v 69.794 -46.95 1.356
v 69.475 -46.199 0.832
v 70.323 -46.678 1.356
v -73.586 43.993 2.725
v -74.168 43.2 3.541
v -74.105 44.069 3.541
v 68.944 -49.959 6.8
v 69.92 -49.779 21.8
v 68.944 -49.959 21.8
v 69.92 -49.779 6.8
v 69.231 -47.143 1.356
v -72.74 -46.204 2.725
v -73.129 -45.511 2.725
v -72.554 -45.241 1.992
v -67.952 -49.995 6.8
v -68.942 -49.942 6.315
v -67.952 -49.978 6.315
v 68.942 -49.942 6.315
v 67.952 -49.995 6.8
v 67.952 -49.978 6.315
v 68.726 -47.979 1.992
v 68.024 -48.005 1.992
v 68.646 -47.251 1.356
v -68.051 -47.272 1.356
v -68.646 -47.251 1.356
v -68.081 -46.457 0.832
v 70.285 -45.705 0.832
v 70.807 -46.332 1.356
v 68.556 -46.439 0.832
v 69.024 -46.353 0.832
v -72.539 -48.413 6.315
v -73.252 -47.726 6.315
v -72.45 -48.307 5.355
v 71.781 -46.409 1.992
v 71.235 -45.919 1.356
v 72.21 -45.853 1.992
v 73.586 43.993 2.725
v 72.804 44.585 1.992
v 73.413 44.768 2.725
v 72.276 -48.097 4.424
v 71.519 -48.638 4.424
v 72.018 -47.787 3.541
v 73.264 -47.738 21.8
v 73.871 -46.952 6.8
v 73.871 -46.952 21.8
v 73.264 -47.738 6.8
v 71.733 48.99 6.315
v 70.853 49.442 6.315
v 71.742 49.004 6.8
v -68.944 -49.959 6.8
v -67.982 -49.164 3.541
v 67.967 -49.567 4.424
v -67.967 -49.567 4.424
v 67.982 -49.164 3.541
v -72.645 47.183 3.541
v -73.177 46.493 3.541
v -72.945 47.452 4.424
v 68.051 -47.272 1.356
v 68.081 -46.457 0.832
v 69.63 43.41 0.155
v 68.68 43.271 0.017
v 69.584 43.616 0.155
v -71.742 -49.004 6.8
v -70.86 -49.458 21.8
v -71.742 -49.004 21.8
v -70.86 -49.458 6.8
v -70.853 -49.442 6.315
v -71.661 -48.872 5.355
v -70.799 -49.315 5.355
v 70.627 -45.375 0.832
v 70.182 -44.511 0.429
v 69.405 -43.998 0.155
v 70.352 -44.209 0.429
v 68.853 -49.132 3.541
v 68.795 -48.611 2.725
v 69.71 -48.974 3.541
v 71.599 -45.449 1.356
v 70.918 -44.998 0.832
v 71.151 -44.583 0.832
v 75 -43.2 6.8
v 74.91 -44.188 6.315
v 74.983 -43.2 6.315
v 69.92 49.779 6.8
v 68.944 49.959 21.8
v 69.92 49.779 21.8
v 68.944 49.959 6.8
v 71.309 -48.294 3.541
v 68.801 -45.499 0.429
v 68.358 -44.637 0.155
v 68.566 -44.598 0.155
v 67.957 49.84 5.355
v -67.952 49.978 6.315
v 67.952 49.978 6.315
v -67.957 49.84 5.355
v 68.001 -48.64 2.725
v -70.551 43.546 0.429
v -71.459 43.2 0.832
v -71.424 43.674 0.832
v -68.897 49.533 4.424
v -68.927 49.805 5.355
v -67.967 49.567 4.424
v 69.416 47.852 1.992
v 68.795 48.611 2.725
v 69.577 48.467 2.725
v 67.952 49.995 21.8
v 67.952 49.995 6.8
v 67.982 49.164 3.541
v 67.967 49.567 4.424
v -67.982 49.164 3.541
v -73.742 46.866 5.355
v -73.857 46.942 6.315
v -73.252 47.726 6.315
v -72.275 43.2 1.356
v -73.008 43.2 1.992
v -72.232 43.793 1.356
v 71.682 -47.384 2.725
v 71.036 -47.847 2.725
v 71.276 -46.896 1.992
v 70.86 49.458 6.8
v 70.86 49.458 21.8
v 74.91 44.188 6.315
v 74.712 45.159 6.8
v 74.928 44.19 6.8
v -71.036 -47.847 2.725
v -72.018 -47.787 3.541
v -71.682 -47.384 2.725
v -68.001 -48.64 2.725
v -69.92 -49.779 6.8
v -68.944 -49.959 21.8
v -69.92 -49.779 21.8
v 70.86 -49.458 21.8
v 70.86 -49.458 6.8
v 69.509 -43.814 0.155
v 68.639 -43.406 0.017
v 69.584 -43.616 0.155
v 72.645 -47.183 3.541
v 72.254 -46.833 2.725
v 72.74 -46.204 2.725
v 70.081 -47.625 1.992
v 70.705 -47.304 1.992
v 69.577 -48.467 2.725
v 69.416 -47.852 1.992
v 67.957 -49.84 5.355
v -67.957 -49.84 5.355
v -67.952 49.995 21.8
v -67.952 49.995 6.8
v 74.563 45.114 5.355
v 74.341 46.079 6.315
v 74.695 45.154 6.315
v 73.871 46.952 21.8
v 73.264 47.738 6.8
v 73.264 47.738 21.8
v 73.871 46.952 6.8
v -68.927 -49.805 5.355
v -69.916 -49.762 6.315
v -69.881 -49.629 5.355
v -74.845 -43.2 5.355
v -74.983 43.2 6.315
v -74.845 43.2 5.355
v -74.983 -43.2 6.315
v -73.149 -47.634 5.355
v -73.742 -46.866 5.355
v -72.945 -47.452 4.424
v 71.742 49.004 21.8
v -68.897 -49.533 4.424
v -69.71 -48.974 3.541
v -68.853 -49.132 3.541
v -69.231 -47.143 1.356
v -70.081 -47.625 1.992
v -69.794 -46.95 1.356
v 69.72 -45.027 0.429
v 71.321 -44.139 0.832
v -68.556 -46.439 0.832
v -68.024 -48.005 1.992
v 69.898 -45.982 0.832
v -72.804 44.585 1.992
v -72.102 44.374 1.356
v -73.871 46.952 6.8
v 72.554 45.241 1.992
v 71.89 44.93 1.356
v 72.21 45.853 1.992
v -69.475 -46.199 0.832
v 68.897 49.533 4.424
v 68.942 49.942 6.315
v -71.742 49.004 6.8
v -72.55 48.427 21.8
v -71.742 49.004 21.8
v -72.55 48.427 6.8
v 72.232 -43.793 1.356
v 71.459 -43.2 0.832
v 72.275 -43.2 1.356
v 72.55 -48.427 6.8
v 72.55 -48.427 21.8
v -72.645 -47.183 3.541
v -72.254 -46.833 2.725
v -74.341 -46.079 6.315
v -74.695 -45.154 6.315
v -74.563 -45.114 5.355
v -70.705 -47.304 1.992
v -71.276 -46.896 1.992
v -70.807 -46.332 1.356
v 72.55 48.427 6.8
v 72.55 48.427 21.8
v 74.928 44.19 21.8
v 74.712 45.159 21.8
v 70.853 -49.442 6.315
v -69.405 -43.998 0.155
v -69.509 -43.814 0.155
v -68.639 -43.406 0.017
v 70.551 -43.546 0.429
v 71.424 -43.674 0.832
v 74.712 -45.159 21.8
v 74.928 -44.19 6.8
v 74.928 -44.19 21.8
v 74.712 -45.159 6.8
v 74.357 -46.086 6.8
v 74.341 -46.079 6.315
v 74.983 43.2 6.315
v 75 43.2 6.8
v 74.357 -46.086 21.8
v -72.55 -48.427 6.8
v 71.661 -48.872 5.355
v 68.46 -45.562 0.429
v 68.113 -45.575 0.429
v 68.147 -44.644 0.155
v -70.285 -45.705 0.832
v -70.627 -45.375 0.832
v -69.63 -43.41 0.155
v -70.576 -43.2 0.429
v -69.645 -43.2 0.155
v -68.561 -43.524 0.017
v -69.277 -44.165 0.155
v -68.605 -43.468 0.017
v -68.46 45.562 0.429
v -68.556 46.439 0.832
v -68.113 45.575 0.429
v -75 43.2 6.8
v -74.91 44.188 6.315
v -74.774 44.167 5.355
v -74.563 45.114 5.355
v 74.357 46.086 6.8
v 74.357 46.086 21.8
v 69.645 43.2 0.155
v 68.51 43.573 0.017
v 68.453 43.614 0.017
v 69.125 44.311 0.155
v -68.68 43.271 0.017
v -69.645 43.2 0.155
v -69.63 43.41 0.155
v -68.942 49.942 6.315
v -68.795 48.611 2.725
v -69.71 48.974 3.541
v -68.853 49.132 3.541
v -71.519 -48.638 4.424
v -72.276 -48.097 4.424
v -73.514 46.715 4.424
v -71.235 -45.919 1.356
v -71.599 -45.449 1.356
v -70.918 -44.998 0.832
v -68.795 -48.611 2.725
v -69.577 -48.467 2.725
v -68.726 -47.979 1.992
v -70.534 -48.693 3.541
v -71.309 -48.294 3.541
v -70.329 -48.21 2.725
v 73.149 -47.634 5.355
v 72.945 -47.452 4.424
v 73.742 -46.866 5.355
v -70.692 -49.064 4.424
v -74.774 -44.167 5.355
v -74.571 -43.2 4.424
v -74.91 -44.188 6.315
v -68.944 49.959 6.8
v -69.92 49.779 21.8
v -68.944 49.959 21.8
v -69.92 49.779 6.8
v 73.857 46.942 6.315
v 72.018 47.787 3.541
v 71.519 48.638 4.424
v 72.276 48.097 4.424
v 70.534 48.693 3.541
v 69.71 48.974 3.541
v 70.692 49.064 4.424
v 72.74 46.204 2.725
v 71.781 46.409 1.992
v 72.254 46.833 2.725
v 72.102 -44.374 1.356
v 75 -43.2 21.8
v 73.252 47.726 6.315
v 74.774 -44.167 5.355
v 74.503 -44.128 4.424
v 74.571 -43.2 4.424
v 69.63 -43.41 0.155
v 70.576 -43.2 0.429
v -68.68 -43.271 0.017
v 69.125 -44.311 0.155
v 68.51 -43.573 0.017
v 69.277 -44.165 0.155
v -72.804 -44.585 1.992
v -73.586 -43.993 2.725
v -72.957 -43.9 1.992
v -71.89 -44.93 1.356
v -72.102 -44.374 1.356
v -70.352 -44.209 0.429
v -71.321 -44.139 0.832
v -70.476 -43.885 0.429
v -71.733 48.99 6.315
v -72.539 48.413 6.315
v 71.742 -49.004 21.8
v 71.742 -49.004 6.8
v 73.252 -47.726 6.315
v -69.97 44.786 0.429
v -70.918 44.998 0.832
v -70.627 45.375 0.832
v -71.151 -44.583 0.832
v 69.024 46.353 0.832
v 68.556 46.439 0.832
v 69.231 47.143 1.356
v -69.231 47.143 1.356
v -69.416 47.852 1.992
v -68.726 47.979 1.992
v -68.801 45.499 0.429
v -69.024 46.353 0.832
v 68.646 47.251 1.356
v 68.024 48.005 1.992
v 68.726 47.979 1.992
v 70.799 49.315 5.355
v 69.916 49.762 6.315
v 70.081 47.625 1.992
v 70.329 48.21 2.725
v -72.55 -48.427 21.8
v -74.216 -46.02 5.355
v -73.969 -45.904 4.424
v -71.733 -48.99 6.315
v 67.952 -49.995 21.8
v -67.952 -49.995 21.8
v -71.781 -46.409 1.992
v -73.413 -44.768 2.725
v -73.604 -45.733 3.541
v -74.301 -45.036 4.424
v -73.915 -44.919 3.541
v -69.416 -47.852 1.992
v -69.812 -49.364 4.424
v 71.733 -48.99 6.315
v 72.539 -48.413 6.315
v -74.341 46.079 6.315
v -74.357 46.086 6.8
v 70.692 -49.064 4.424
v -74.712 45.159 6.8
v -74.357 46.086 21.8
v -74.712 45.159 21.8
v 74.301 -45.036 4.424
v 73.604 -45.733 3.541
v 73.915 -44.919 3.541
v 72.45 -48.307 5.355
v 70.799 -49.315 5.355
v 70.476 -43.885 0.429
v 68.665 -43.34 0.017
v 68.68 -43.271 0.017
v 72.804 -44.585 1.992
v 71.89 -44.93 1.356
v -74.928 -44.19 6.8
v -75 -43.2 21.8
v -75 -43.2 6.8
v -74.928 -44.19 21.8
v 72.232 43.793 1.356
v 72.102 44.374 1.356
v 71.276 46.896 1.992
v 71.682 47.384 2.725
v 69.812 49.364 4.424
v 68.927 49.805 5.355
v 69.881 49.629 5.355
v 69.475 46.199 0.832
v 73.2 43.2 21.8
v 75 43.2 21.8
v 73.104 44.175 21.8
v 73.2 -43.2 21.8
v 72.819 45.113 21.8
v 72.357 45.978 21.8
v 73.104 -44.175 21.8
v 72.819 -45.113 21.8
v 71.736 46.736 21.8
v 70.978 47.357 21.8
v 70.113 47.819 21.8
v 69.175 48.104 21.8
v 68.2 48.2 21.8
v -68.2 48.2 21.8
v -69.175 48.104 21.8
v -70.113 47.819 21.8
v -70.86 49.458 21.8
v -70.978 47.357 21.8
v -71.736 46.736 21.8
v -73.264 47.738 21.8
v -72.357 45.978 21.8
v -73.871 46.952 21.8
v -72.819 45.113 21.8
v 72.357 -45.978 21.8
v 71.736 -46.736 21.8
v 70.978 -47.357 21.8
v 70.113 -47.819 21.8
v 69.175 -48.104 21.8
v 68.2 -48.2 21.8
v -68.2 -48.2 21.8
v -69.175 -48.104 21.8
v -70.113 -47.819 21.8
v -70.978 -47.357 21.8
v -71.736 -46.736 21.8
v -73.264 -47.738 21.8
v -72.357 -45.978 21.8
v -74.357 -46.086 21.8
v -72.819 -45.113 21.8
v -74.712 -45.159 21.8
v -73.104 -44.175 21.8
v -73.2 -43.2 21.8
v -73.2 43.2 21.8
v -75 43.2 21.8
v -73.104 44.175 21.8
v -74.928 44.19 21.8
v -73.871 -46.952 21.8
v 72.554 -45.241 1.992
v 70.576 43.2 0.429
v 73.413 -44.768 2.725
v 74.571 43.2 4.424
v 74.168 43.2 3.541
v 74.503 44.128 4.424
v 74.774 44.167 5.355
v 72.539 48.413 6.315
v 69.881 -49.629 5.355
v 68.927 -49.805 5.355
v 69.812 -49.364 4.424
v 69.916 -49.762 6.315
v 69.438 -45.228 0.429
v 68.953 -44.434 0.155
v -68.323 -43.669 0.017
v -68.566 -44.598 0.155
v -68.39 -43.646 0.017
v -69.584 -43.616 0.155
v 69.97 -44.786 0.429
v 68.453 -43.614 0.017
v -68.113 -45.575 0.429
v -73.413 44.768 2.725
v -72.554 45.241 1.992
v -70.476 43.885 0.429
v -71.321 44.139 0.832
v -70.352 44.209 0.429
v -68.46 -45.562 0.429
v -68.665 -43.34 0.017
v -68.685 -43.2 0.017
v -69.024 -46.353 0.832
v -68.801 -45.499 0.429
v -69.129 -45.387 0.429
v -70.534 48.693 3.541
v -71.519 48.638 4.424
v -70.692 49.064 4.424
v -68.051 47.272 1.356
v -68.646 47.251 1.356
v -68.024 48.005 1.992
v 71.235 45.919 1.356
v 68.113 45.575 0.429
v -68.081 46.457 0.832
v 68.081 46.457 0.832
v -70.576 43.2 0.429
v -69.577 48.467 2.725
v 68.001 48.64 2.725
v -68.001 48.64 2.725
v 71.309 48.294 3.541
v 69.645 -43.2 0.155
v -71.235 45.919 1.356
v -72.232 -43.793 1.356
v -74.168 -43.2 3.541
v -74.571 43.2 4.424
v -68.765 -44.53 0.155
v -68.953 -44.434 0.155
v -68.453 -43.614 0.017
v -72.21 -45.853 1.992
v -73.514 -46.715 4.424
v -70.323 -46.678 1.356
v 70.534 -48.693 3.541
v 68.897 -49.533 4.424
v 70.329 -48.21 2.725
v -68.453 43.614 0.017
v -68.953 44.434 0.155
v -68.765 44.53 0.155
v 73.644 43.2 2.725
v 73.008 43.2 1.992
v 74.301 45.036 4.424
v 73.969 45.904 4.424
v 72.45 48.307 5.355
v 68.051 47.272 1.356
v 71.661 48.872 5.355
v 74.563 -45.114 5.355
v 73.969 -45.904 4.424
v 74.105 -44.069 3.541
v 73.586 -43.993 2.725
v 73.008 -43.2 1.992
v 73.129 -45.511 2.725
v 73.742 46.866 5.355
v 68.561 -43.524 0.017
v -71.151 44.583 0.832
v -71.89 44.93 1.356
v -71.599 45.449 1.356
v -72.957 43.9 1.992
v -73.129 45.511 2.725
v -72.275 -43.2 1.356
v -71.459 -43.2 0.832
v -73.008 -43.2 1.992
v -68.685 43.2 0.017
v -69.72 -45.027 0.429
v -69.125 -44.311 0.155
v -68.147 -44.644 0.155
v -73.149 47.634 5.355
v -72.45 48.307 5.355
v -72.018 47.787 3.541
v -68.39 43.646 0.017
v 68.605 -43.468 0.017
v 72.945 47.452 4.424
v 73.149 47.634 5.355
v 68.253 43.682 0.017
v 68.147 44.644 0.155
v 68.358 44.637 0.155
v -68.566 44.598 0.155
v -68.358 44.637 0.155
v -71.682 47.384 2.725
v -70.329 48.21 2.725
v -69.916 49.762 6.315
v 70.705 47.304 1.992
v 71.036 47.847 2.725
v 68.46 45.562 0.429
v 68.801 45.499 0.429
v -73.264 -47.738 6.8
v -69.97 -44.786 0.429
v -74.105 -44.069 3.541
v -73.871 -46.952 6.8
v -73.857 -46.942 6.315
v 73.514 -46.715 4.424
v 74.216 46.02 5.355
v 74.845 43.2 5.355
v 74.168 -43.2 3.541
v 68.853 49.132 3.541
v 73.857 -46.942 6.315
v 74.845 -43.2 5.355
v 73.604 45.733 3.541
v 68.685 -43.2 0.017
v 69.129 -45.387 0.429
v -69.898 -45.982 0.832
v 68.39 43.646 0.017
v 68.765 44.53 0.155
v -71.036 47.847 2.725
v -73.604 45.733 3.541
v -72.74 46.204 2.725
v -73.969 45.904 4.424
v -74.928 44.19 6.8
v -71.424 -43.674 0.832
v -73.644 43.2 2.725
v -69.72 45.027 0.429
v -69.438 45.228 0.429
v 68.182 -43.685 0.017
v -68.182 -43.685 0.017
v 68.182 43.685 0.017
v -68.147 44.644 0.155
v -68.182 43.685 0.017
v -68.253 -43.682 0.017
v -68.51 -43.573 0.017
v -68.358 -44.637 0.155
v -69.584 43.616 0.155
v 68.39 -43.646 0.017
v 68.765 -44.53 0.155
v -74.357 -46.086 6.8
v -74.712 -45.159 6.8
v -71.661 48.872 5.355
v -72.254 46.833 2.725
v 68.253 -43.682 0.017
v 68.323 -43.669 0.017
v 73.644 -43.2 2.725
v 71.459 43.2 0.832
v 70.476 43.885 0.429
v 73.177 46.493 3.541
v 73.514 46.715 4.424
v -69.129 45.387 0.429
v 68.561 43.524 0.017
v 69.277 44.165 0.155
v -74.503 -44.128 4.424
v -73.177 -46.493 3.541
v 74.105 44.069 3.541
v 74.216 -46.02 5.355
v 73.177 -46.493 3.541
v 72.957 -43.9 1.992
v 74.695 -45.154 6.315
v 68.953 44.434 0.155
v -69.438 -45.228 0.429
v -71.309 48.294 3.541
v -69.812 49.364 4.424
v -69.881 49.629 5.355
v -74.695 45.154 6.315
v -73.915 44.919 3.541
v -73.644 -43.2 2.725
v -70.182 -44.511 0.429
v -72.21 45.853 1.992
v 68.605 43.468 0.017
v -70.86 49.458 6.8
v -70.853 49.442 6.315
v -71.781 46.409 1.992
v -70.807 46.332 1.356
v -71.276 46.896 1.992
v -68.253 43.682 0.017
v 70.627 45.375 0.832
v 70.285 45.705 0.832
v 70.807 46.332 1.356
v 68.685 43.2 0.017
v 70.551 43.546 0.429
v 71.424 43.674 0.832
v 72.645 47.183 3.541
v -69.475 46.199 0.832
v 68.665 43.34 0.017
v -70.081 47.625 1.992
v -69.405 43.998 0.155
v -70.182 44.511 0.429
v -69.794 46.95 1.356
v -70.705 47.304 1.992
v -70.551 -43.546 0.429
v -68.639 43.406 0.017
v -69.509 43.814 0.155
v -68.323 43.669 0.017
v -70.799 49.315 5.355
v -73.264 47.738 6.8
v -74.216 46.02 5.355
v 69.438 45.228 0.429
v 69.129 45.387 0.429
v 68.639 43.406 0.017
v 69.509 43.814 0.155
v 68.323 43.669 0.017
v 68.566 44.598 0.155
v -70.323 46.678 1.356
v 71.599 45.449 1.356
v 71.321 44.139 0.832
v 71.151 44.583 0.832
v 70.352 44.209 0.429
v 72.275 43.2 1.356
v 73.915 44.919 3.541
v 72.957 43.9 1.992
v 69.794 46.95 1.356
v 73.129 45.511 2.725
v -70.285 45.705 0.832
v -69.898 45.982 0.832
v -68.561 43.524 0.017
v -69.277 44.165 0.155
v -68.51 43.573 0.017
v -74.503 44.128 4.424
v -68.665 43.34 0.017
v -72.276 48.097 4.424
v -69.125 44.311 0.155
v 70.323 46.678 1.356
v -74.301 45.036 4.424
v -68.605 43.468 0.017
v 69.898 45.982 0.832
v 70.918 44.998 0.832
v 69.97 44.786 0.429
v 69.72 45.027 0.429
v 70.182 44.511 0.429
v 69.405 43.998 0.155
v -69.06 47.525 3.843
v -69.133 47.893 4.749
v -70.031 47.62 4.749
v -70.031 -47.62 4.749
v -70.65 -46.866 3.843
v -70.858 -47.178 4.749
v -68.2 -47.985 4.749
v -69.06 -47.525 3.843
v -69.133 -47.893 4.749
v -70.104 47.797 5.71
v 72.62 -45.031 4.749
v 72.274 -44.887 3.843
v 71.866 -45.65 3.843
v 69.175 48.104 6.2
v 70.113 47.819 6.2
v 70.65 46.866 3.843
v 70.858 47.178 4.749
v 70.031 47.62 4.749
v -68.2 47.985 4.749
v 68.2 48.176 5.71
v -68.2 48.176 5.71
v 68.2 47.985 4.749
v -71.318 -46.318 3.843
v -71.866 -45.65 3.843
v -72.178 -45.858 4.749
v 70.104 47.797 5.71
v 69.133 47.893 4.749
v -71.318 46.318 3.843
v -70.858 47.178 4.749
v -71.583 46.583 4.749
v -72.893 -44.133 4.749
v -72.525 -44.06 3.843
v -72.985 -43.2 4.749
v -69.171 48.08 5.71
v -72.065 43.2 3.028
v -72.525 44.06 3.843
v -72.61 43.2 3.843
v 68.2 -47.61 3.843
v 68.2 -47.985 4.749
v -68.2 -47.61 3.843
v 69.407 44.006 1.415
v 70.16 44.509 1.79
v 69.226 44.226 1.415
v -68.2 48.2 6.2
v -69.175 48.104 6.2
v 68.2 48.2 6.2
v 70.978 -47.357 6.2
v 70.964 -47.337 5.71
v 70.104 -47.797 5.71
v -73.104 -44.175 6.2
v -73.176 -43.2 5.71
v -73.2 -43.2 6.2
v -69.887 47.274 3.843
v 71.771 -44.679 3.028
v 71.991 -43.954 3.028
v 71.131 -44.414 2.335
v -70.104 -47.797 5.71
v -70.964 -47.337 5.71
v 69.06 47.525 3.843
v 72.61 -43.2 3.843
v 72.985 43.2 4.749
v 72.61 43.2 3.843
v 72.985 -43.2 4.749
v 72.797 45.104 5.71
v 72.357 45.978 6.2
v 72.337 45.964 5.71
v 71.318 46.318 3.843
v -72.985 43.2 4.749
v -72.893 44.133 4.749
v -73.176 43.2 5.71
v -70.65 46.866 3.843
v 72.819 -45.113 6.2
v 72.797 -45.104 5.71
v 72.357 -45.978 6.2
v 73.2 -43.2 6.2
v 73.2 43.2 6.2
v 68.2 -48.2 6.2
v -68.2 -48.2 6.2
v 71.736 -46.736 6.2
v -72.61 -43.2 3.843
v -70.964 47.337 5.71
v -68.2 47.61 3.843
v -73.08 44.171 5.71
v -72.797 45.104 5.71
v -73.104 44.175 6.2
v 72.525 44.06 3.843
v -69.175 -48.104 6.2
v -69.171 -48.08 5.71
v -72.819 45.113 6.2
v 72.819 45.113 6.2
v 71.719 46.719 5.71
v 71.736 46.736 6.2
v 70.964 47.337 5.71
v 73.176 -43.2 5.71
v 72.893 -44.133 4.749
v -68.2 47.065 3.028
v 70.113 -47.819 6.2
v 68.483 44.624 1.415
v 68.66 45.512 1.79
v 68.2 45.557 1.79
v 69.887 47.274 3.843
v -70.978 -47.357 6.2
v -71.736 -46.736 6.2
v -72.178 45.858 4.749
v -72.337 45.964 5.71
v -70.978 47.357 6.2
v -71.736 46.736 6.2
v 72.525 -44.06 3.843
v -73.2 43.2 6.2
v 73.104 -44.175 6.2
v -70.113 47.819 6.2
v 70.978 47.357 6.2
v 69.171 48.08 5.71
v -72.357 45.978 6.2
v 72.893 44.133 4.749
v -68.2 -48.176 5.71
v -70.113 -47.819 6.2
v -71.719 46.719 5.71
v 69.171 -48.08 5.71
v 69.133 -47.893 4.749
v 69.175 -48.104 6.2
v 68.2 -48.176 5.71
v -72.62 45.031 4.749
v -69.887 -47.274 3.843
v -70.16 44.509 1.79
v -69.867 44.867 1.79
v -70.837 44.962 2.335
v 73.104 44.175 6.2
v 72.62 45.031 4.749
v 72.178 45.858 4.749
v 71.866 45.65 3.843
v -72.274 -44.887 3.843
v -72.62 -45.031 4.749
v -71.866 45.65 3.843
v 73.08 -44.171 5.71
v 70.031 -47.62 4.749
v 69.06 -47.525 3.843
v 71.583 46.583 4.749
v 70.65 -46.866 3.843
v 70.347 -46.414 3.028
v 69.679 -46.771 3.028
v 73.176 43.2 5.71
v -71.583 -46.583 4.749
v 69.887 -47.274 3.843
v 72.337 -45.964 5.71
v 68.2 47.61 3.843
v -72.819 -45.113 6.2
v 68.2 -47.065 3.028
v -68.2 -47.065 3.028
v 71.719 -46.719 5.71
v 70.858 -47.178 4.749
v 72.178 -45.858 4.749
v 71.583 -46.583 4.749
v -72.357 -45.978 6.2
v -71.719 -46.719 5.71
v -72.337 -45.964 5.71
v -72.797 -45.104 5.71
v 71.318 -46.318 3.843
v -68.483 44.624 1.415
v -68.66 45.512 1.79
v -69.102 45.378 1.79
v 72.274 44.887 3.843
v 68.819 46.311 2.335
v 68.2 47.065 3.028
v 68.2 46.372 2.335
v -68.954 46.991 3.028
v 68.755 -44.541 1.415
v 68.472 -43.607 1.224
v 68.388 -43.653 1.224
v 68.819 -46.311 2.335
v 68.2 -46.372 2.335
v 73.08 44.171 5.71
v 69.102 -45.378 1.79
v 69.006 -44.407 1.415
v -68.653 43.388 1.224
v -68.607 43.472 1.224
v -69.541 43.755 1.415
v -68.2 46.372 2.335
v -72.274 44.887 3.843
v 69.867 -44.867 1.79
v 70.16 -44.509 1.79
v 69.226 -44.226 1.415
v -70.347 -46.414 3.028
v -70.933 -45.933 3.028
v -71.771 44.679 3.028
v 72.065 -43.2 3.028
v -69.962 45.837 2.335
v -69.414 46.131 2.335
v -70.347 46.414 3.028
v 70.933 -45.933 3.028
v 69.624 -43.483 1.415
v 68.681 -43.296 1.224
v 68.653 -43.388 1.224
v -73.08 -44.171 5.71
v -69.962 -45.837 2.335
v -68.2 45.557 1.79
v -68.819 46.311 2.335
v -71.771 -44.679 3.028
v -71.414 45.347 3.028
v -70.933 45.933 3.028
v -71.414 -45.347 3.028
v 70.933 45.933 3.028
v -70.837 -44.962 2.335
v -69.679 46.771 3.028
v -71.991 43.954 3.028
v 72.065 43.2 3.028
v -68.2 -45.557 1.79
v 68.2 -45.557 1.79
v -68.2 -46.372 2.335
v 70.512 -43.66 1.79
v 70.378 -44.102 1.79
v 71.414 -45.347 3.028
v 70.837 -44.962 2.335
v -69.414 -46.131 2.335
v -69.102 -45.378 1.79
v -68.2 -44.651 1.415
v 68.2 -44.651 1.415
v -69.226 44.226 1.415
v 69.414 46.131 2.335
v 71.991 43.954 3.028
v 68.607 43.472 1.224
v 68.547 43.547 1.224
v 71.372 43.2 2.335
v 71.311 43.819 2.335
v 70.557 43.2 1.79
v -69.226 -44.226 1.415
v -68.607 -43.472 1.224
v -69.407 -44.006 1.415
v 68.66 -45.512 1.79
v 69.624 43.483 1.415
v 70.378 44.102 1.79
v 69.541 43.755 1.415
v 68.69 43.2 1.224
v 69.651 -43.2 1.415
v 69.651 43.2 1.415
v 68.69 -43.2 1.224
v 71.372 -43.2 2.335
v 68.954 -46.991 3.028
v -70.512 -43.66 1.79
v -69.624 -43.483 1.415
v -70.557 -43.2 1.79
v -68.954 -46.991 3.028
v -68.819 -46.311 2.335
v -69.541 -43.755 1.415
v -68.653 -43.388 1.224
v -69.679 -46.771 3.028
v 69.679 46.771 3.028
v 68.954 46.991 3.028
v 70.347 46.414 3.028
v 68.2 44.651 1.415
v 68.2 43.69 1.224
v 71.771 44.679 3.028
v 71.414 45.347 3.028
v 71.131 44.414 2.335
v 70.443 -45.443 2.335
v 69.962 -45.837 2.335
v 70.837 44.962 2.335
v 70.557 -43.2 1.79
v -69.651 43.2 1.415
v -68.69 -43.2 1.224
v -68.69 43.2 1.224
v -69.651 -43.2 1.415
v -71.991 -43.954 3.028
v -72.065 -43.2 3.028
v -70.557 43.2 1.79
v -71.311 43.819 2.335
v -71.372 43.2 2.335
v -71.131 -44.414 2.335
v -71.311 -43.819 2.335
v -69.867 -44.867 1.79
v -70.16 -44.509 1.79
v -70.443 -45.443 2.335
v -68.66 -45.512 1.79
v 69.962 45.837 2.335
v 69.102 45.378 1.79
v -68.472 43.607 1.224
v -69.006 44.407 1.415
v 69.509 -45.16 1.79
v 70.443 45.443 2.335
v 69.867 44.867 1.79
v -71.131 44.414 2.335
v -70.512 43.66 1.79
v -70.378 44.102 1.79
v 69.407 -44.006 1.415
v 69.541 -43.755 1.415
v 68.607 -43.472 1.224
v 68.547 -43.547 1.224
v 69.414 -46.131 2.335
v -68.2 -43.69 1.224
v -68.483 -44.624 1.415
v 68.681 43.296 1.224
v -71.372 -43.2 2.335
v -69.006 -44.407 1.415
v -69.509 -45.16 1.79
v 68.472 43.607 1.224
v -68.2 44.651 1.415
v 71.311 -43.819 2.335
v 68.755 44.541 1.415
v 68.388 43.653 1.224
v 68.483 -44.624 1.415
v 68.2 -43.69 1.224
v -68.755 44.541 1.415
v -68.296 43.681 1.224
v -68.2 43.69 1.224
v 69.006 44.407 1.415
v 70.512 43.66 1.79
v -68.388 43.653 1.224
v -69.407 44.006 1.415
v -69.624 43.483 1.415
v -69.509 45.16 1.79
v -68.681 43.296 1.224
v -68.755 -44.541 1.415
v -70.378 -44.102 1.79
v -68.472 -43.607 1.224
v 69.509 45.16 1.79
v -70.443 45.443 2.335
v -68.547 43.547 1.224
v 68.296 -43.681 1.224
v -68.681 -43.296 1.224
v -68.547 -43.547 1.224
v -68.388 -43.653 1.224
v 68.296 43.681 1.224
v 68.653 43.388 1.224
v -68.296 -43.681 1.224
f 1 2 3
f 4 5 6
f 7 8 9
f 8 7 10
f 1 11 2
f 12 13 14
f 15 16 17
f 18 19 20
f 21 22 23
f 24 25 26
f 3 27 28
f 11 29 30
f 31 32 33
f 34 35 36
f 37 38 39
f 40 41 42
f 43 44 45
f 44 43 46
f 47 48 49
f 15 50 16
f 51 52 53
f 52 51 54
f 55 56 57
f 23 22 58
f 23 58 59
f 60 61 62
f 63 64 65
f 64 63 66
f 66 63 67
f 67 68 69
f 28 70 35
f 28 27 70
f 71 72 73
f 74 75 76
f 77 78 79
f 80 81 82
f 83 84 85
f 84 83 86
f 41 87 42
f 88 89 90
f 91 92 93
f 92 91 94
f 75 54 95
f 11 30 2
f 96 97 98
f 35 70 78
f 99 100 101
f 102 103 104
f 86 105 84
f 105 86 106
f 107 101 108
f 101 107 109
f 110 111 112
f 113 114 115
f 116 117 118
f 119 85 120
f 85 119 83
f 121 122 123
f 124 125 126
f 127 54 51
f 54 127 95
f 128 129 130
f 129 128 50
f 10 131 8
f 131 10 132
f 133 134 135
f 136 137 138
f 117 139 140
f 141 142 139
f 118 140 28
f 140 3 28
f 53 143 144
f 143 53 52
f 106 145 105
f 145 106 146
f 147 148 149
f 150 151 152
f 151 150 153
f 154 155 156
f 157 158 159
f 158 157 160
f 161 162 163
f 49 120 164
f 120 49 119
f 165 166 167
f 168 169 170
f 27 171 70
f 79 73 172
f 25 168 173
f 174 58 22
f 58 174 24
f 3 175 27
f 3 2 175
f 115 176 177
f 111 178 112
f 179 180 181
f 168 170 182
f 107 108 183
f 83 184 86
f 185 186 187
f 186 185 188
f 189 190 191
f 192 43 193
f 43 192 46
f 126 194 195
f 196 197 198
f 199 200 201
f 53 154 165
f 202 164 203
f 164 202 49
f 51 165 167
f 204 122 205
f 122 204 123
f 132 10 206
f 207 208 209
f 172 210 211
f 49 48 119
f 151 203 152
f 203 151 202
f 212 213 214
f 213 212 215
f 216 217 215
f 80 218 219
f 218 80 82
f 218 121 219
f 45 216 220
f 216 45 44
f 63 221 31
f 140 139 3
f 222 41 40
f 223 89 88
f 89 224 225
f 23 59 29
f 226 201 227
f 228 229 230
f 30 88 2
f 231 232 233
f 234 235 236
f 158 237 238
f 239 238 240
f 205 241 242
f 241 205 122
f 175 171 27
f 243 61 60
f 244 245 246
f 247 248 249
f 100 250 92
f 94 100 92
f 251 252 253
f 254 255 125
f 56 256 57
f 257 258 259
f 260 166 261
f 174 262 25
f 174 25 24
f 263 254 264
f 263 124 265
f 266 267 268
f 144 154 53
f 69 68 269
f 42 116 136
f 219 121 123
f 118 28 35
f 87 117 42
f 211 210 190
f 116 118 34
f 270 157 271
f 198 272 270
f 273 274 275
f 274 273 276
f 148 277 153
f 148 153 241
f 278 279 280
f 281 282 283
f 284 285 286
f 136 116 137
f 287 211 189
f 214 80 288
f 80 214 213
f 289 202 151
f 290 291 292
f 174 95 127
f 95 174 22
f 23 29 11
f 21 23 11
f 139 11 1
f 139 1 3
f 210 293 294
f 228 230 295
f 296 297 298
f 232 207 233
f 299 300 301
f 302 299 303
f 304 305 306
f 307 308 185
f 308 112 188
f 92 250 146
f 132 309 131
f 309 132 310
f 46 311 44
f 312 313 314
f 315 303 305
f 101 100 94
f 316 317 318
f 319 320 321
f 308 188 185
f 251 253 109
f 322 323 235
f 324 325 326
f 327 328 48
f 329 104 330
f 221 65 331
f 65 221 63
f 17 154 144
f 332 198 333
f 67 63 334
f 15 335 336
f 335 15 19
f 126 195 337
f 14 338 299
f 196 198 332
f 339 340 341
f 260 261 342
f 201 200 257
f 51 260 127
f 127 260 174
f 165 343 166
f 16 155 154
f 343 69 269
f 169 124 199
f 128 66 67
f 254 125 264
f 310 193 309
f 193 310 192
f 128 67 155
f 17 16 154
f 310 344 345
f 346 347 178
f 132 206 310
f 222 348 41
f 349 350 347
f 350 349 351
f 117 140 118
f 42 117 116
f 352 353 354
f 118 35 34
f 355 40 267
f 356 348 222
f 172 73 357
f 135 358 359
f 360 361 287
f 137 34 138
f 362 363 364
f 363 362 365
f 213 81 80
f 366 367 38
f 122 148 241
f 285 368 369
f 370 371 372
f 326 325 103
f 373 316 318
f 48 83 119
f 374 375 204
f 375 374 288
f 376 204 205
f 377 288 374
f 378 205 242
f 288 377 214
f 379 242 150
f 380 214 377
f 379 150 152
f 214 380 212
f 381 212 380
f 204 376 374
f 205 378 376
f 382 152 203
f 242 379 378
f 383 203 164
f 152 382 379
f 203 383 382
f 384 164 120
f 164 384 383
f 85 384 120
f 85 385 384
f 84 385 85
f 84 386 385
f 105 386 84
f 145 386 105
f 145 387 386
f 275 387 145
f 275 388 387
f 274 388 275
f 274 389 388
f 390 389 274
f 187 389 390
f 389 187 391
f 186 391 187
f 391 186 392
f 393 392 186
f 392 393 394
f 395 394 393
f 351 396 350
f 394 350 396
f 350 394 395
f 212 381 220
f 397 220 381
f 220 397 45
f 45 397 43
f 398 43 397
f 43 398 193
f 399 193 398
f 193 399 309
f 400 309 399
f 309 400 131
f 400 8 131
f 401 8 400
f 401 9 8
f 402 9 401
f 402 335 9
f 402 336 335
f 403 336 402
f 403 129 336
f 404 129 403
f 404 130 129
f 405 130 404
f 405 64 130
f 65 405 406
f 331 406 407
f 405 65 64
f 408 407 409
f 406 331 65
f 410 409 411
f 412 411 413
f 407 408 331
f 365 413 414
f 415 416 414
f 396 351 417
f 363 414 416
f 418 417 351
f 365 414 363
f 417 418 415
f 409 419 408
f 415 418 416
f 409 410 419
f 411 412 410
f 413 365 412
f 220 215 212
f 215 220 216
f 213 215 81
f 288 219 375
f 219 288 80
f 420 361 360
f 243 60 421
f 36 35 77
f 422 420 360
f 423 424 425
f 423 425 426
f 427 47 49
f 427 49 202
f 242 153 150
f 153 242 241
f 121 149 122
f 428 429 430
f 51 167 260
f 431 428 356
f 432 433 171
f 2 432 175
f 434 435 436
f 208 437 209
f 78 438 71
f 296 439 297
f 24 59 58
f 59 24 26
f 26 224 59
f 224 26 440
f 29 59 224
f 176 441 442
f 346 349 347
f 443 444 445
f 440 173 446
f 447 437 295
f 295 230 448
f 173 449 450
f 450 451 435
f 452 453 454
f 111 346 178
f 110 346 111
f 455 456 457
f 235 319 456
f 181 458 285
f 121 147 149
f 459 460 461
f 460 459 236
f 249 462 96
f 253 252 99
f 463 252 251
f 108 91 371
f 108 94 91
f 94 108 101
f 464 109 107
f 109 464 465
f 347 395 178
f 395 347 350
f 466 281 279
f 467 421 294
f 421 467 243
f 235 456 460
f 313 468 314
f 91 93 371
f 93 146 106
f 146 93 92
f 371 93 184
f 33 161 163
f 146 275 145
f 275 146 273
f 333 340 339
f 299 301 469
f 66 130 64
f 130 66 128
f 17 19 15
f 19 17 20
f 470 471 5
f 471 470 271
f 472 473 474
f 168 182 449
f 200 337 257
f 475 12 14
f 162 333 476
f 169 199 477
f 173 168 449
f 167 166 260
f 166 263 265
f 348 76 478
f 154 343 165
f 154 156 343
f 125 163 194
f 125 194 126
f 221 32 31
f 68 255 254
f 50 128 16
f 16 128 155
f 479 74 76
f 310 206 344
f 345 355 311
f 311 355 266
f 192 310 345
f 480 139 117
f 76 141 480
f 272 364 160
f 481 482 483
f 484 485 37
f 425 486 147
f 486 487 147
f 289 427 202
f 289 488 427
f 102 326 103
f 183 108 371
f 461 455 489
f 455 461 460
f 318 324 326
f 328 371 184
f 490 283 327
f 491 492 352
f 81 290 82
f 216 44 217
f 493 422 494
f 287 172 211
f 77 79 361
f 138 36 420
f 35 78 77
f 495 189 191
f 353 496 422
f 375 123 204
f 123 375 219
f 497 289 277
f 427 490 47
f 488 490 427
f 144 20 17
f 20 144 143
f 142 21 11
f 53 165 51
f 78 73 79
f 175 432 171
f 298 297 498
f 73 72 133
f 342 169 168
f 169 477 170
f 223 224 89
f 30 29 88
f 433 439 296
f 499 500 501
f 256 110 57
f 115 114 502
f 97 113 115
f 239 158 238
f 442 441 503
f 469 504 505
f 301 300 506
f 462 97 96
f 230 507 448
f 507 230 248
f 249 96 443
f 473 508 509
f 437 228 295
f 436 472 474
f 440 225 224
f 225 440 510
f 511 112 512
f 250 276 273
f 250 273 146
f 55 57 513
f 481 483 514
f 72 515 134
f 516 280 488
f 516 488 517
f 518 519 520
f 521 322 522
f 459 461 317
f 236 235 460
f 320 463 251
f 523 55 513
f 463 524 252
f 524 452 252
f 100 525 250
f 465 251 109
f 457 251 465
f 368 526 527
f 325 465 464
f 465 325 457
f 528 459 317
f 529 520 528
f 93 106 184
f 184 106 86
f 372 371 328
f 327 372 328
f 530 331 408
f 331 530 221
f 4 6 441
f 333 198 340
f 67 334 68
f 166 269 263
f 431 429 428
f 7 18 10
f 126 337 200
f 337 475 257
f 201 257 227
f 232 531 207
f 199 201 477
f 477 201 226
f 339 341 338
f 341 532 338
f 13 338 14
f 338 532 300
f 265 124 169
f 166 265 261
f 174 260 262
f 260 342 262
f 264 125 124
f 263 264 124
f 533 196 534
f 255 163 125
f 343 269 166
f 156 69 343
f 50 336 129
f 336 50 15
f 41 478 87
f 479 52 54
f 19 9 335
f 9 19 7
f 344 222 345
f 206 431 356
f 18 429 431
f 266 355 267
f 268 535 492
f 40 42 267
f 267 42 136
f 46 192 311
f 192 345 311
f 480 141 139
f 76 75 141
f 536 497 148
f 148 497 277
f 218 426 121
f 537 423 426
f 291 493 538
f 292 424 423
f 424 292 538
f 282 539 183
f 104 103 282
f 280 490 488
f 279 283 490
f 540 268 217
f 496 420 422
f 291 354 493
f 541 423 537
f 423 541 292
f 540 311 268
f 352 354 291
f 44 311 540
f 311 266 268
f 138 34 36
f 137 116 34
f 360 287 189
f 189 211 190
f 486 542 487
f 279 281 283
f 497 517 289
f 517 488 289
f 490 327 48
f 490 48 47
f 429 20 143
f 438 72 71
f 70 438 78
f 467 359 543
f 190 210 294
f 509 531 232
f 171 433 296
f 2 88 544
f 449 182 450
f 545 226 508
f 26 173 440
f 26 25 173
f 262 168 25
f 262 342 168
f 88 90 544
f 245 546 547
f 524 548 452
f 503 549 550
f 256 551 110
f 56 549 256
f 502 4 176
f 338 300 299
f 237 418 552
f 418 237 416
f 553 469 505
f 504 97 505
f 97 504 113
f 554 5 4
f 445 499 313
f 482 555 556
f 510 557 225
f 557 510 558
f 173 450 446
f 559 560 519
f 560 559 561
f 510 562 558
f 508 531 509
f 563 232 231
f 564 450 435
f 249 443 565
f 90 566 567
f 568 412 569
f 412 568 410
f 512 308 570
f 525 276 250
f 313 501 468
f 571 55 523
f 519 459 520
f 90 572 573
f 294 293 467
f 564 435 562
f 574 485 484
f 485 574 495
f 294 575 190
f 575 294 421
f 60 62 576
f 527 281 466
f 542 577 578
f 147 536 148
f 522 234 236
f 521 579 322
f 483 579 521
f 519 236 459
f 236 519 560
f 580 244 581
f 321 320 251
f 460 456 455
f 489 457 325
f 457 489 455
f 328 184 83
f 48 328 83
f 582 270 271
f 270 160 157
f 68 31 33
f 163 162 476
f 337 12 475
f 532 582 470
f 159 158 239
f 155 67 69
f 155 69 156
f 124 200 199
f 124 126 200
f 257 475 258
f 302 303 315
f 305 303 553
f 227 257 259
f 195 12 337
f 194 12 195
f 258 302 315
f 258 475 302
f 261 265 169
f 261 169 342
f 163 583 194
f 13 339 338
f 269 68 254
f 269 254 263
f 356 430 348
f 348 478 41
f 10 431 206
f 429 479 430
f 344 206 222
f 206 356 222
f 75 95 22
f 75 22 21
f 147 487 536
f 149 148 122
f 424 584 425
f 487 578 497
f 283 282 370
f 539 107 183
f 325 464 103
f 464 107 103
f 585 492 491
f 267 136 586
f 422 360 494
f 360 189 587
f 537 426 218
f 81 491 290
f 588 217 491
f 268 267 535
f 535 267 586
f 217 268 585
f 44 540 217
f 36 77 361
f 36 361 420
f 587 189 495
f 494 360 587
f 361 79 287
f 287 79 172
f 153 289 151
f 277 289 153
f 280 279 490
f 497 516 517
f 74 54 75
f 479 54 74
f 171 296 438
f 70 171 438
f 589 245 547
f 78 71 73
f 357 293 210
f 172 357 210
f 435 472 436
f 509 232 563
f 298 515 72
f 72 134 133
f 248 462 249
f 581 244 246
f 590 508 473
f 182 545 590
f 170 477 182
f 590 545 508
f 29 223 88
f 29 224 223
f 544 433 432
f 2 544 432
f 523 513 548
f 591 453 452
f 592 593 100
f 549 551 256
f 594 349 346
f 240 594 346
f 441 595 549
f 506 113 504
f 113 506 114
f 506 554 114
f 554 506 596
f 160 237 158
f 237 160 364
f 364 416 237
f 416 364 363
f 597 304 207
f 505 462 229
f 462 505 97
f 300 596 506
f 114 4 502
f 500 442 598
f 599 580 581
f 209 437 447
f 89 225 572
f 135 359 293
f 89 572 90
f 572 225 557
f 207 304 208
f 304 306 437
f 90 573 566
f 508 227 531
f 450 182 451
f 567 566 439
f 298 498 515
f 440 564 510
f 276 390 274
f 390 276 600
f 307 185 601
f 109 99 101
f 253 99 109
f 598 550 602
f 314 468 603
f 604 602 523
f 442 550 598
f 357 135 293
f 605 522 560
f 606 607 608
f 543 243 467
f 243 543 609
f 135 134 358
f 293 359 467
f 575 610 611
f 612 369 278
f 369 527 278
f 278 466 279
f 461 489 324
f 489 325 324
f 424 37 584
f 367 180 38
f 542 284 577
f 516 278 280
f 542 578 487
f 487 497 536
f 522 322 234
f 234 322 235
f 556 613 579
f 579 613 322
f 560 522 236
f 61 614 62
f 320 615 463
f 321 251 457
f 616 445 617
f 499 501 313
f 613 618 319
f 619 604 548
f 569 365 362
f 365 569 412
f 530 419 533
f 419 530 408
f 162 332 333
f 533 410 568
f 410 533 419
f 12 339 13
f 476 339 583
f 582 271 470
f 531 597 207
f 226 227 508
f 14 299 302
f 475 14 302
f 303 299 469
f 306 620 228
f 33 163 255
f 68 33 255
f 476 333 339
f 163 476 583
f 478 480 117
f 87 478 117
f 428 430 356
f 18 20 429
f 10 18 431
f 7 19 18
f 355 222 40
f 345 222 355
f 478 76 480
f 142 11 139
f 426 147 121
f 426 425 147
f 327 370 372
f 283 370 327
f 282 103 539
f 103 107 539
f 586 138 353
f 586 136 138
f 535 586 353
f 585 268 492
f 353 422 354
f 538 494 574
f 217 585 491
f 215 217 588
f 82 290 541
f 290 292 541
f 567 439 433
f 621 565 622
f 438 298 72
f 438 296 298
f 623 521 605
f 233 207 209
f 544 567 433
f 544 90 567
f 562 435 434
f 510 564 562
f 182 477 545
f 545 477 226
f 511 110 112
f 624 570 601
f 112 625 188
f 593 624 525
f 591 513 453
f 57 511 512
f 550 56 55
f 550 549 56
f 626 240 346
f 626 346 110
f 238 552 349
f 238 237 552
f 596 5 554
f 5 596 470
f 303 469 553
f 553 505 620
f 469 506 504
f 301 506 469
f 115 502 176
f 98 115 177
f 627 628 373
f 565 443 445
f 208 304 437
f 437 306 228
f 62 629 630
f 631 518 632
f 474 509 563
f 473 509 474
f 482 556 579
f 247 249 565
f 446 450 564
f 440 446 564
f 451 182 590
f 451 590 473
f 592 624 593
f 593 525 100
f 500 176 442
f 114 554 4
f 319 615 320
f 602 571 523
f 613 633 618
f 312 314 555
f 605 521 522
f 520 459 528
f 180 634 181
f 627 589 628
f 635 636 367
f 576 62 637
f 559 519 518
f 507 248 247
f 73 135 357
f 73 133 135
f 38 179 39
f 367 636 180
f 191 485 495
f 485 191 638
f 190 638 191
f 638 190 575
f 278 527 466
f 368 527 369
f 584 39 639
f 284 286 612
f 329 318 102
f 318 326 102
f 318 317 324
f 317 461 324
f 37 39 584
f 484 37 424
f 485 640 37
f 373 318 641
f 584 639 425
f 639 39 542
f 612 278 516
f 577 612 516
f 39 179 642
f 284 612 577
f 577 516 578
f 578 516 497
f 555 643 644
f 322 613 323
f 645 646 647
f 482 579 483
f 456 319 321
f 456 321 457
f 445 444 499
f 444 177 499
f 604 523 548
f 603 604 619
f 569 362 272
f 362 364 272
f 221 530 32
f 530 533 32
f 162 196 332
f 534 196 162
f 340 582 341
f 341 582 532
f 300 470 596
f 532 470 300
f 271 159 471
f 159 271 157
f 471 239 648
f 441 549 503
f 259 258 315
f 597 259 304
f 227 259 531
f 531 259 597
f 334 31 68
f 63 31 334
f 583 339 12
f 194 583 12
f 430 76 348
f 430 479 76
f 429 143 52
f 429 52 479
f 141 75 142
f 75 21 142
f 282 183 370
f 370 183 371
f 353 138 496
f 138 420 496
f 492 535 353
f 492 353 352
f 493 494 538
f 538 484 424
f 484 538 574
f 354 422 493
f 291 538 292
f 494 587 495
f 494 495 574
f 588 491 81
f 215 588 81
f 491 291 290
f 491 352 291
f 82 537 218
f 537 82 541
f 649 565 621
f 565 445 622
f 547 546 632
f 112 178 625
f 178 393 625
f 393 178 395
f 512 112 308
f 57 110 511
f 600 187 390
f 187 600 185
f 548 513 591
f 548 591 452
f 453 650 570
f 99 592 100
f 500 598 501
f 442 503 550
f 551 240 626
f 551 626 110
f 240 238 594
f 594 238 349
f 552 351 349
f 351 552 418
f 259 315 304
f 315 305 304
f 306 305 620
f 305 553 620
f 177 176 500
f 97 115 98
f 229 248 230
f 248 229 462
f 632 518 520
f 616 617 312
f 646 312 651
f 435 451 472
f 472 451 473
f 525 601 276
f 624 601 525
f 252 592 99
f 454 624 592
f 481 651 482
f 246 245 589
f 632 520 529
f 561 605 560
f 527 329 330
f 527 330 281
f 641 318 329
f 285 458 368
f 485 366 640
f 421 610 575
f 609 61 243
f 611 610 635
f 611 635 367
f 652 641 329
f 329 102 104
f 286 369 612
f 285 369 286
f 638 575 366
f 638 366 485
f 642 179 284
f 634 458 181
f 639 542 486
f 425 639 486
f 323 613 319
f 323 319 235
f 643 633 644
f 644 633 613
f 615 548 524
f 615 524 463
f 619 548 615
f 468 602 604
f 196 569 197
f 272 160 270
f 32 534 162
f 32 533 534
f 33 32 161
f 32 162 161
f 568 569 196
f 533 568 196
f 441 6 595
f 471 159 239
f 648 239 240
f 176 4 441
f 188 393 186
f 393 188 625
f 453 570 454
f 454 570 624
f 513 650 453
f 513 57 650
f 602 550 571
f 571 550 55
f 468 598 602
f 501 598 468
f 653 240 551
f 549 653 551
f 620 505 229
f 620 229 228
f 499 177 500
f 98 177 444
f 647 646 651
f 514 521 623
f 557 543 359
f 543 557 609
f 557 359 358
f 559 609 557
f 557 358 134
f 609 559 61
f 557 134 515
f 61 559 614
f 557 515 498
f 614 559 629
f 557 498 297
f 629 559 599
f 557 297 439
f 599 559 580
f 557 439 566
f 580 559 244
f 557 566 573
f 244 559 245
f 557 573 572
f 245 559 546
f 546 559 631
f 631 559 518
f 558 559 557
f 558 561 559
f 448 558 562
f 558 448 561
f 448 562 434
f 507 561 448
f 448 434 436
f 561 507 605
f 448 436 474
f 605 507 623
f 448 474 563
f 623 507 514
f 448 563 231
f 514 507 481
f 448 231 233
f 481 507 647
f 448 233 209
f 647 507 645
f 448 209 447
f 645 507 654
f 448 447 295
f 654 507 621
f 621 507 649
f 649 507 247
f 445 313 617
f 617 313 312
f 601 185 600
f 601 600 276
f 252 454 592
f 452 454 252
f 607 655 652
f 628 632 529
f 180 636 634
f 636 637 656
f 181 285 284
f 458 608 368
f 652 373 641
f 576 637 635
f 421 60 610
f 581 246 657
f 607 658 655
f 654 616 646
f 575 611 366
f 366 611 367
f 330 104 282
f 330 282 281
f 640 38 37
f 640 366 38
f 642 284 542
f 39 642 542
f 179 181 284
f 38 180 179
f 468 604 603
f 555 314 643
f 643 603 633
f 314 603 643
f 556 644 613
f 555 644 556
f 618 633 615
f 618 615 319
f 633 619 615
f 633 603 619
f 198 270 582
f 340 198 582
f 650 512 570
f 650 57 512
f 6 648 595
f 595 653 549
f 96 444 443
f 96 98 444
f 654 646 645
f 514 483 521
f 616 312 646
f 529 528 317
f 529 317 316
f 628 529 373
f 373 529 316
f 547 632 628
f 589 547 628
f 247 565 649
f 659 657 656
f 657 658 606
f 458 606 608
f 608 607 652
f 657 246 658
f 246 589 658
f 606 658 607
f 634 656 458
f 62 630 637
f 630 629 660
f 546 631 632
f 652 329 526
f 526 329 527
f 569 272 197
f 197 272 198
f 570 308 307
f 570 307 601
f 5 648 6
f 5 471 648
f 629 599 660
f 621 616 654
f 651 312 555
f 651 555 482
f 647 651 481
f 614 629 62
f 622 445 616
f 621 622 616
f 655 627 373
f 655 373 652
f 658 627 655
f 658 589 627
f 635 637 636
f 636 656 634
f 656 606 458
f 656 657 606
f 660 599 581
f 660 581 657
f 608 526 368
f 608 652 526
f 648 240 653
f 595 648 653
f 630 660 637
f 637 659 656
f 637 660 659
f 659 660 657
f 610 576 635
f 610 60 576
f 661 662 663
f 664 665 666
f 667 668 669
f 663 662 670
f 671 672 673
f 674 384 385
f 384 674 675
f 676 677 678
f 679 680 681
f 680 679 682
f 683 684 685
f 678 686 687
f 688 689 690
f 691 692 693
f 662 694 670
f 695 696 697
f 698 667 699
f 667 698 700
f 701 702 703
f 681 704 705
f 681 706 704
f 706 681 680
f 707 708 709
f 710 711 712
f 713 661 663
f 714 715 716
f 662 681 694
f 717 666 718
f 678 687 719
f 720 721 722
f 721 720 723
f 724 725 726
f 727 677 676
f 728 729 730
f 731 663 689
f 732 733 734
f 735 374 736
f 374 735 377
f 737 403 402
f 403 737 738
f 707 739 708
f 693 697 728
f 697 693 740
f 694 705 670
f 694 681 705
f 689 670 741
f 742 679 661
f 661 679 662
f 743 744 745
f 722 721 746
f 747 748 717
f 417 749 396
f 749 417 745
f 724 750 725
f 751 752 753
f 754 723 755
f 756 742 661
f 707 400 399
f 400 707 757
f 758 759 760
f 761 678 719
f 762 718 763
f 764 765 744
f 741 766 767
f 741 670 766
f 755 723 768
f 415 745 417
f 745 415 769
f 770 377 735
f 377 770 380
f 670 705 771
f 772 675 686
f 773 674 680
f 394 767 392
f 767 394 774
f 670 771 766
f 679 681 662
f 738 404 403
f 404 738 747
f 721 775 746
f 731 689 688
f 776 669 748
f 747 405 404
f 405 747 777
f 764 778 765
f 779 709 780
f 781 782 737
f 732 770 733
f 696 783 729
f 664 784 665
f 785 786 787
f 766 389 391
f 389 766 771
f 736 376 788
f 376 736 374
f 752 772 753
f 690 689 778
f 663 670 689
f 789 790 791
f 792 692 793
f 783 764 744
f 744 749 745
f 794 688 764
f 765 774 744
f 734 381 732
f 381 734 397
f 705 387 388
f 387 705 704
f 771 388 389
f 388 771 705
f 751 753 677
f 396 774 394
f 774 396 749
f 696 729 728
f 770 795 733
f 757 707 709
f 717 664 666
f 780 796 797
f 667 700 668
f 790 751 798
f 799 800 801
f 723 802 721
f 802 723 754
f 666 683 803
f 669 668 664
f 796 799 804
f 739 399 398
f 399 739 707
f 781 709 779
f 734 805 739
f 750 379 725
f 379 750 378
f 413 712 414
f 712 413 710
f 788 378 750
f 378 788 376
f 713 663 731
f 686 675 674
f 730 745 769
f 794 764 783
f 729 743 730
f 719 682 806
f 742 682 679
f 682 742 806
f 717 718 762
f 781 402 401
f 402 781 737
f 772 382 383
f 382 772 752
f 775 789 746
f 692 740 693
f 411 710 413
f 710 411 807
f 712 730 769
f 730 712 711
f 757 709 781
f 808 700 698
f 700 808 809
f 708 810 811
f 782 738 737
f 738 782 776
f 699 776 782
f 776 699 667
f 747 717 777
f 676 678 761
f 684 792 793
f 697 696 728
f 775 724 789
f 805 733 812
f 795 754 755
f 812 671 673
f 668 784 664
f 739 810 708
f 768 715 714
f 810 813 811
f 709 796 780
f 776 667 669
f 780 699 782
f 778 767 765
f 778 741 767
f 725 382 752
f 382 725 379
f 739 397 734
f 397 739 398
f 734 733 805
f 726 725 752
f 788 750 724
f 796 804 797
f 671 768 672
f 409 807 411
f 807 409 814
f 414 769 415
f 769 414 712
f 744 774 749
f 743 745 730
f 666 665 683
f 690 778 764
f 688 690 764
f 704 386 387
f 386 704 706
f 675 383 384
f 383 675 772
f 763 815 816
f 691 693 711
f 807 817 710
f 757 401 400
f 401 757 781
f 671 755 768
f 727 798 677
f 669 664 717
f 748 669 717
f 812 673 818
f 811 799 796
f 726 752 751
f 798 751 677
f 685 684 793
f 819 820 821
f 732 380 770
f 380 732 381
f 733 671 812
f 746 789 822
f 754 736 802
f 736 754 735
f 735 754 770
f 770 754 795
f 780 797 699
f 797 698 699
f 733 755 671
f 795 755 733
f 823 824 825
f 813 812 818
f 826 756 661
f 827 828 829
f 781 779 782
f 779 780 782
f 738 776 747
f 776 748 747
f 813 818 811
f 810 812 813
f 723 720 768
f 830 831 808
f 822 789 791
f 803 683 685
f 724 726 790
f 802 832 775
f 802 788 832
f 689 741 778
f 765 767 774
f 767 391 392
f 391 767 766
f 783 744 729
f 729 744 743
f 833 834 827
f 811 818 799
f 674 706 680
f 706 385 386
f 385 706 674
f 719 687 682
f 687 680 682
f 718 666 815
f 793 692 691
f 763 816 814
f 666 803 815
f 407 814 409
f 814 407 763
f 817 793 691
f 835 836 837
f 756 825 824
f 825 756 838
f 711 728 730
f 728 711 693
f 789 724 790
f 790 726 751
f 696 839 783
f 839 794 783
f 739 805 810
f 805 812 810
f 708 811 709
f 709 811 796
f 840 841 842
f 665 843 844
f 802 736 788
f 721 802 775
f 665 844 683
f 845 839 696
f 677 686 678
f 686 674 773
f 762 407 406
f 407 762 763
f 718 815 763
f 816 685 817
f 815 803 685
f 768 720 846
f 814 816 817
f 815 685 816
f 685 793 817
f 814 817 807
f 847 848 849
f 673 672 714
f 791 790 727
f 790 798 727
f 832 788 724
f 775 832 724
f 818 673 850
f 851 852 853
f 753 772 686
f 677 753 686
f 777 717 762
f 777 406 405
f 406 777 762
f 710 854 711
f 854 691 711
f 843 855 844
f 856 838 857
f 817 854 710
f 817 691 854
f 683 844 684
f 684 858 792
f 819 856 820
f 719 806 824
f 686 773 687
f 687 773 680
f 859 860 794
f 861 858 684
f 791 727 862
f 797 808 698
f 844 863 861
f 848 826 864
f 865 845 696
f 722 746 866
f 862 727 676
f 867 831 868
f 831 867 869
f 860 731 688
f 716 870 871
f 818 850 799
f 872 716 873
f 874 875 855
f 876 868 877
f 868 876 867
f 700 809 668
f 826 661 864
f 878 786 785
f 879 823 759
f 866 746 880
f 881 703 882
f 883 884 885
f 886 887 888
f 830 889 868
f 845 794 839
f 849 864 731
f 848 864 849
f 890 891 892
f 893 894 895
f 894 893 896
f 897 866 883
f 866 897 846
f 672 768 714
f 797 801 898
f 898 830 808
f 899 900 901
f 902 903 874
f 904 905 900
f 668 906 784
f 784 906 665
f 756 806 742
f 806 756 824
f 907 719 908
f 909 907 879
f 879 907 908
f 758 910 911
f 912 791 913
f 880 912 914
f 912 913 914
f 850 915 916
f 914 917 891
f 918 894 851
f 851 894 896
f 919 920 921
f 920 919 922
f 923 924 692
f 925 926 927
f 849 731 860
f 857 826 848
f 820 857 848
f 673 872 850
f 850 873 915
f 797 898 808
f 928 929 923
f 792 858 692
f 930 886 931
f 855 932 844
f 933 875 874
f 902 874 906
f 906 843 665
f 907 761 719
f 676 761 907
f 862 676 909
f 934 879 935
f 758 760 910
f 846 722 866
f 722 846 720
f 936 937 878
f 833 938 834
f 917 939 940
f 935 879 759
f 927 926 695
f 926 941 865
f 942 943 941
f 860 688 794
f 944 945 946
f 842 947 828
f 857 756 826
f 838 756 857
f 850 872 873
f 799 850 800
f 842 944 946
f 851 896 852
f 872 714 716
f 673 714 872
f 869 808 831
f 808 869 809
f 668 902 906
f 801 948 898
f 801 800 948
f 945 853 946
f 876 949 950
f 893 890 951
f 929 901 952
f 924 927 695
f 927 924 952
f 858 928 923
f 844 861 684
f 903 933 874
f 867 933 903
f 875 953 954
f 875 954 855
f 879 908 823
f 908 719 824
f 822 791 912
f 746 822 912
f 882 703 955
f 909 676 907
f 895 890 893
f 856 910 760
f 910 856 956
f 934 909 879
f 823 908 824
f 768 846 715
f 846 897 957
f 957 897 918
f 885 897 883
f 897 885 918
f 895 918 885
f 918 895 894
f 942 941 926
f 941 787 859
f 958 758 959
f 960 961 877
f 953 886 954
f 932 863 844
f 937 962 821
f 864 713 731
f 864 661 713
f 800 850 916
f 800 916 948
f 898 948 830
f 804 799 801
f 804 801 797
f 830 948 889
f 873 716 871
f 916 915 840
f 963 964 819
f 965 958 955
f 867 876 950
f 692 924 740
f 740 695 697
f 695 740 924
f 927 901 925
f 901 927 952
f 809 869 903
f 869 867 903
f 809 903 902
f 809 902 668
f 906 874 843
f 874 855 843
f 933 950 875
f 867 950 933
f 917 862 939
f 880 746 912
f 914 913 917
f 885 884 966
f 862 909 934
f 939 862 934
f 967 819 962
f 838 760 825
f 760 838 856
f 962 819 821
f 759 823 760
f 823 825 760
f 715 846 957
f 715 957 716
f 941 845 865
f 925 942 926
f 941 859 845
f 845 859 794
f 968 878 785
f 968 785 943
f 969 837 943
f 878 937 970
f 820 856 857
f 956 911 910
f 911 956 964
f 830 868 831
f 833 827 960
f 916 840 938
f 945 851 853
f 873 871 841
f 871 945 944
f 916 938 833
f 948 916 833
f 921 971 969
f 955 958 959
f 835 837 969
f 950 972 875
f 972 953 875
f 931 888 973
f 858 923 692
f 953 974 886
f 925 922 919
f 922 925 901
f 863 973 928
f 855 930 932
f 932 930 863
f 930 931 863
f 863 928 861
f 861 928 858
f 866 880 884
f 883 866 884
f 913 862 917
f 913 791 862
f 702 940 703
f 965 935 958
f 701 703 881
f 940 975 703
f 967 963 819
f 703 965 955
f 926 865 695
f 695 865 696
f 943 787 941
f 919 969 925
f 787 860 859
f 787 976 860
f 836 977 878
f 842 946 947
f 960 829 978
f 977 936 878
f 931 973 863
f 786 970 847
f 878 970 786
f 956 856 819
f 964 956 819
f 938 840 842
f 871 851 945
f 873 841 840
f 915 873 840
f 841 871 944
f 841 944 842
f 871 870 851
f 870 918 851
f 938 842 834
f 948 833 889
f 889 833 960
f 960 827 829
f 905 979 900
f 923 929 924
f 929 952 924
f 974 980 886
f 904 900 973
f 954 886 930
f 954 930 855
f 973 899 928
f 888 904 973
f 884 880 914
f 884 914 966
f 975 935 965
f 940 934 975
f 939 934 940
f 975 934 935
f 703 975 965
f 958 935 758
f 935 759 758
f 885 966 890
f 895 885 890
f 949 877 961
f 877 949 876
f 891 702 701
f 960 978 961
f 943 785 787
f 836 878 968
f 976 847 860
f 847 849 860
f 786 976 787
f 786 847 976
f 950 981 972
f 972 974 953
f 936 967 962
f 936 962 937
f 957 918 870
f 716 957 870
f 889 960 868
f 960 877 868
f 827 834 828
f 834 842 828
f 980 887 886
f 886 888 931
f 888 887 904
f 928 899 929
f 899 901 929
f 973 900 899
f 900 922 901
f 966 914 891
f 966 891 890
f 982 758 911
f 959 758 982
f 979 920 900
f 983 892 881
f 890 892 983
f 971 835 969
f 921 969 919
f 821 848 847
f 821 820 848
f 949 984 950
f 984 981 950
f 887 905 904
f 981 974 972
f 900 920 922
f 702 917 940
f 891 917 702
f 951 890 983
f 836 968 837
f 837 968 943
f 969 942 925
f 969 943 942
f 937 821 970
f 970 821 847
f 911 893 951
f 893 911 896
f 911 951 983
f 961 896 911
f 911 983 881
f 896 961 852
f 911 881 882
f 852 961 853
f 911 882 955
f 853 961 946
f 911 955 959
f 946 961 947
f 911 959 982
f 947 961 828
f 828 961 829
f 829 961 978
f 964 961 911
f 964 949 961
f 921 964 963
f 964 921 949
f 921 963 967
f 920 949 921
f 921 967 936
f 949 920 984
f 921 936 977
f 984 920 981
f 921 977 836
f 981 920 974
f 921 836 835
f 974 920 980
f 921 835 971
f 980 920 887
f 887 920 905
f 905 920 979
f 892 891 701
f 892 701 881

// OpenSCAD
// -*- mode: SCAD ; c-file-style: "ellemtel" ; coding: utf-8 -*-
//
// Wasserschale als Luftbefeuchter
//
// © 2018–2023 Roland Sieker <ospalh@gmail.com>
// Licence: CC-BY-SA 4.0

/* [Global] */

// … to preview. You will get all parts as separate STLs when you click “Create Thing”.
part = "s"; // [s: Set, a: Part A, b: Part B]

// Set this to “render” and click on “Create Thing” when done with the setup.
preview = 1; // [0:render, 1:preview]

/* [Sizes] */

// Size in both directions
size_x = 150;  // [30:1:240]
size_y = 100;  // [30:1:240]
size_z = 20;  // [10:1:240]



/* [Hidden] */

// Done with the customizer

// *******************************************************
// Extra parameters. These can be changed reasonably safely.


w = 1.8;  // Wall width
p = 1.2;  // Bottom, top plate hight
c = 0.4;  // Clearance
r_k = 5;
angle = 60; // Overhangs much below 60° are a problem for me

// *******************************************************
// Some shortcuts. These shouldn’t be changed


module kmirror(maxis=[1, 0, 0])
{
   // Keep *and* mirror an object. Standard is left and right mirroring.
   children();
   mirror(maxis)
   {
      children();
   }
}

tau = 2 * PI;  // π is still wrong. τ = circumference / r

xy_factor = 1/tan(angle);
// To get from a hight to a horizontal width inclined correctly
z_factor = tan(angle);  // The other way around


some_distance = 50;
ms = 0.01;  // Muggeseggele.

// fn for differently sized objects and fs, fa; all for preview or rendering.
pna = 40;
pnb = 15;
pa = 5;
ps = 1;
rna = 180;
rnb = 30;
ra = 2;
rs = 0.25;
function na() = (preview) ? pna : rna;
function nb() = (preview) ? pnb : rnb;
$fs = (preview) ? ps : rs;
$fa = (preview) ? pa : ra;

// *******************************************************
// End setup



// *******************************************************
// Generate the parts

print_part();


if ("s" == part)
{
   preview_parts();
}

if ("st" == part)
{
   // Use "st" during development
   stack_parts();
}

module print_part()
{
   if ("a" == part)
   {
      schale();
   }
   if ("b" == part)
   {
      zpin();
   }
}

module preview_parts()
{
   schale();
   translate([some_distance, 0, 0])
   {
      zpin();
   }
}

module stack_parts()
{
   // intersection()
   {
      color("yellow")
      {
         schale();
      }
      translate([0,0,30])
      {
         color("red")
         {
            zpin();
         }
      }
   }
}

// *******************************************************
// Code for the parts themselves


module schale()
{
   difference()
   {
      schalenform(size_x/2-r_k-w, size_y/2-r_k-w, r_k+w, size_z-r_k);
      translate([0,0,p])
      {
         schalenform(size_x/2-r_k-w, size_y/2-r_k-w, r_k, size_z+r_k+ms);
      }
   }
}

module schalenform(x,y,r,h)
{
   hull()
   {
      kmirror([0, 1, 0])
      {
         kmirror()
         {
            translate([x,y,0])
            {
               pin(r,h);
            }
         }
      }
   }
}

module pin(r,h)
{
   translate([0,0,r])
   {
      sphere(r=r);
      cylinder(r=r, h=h);
   }
}


module zpin()
{}
